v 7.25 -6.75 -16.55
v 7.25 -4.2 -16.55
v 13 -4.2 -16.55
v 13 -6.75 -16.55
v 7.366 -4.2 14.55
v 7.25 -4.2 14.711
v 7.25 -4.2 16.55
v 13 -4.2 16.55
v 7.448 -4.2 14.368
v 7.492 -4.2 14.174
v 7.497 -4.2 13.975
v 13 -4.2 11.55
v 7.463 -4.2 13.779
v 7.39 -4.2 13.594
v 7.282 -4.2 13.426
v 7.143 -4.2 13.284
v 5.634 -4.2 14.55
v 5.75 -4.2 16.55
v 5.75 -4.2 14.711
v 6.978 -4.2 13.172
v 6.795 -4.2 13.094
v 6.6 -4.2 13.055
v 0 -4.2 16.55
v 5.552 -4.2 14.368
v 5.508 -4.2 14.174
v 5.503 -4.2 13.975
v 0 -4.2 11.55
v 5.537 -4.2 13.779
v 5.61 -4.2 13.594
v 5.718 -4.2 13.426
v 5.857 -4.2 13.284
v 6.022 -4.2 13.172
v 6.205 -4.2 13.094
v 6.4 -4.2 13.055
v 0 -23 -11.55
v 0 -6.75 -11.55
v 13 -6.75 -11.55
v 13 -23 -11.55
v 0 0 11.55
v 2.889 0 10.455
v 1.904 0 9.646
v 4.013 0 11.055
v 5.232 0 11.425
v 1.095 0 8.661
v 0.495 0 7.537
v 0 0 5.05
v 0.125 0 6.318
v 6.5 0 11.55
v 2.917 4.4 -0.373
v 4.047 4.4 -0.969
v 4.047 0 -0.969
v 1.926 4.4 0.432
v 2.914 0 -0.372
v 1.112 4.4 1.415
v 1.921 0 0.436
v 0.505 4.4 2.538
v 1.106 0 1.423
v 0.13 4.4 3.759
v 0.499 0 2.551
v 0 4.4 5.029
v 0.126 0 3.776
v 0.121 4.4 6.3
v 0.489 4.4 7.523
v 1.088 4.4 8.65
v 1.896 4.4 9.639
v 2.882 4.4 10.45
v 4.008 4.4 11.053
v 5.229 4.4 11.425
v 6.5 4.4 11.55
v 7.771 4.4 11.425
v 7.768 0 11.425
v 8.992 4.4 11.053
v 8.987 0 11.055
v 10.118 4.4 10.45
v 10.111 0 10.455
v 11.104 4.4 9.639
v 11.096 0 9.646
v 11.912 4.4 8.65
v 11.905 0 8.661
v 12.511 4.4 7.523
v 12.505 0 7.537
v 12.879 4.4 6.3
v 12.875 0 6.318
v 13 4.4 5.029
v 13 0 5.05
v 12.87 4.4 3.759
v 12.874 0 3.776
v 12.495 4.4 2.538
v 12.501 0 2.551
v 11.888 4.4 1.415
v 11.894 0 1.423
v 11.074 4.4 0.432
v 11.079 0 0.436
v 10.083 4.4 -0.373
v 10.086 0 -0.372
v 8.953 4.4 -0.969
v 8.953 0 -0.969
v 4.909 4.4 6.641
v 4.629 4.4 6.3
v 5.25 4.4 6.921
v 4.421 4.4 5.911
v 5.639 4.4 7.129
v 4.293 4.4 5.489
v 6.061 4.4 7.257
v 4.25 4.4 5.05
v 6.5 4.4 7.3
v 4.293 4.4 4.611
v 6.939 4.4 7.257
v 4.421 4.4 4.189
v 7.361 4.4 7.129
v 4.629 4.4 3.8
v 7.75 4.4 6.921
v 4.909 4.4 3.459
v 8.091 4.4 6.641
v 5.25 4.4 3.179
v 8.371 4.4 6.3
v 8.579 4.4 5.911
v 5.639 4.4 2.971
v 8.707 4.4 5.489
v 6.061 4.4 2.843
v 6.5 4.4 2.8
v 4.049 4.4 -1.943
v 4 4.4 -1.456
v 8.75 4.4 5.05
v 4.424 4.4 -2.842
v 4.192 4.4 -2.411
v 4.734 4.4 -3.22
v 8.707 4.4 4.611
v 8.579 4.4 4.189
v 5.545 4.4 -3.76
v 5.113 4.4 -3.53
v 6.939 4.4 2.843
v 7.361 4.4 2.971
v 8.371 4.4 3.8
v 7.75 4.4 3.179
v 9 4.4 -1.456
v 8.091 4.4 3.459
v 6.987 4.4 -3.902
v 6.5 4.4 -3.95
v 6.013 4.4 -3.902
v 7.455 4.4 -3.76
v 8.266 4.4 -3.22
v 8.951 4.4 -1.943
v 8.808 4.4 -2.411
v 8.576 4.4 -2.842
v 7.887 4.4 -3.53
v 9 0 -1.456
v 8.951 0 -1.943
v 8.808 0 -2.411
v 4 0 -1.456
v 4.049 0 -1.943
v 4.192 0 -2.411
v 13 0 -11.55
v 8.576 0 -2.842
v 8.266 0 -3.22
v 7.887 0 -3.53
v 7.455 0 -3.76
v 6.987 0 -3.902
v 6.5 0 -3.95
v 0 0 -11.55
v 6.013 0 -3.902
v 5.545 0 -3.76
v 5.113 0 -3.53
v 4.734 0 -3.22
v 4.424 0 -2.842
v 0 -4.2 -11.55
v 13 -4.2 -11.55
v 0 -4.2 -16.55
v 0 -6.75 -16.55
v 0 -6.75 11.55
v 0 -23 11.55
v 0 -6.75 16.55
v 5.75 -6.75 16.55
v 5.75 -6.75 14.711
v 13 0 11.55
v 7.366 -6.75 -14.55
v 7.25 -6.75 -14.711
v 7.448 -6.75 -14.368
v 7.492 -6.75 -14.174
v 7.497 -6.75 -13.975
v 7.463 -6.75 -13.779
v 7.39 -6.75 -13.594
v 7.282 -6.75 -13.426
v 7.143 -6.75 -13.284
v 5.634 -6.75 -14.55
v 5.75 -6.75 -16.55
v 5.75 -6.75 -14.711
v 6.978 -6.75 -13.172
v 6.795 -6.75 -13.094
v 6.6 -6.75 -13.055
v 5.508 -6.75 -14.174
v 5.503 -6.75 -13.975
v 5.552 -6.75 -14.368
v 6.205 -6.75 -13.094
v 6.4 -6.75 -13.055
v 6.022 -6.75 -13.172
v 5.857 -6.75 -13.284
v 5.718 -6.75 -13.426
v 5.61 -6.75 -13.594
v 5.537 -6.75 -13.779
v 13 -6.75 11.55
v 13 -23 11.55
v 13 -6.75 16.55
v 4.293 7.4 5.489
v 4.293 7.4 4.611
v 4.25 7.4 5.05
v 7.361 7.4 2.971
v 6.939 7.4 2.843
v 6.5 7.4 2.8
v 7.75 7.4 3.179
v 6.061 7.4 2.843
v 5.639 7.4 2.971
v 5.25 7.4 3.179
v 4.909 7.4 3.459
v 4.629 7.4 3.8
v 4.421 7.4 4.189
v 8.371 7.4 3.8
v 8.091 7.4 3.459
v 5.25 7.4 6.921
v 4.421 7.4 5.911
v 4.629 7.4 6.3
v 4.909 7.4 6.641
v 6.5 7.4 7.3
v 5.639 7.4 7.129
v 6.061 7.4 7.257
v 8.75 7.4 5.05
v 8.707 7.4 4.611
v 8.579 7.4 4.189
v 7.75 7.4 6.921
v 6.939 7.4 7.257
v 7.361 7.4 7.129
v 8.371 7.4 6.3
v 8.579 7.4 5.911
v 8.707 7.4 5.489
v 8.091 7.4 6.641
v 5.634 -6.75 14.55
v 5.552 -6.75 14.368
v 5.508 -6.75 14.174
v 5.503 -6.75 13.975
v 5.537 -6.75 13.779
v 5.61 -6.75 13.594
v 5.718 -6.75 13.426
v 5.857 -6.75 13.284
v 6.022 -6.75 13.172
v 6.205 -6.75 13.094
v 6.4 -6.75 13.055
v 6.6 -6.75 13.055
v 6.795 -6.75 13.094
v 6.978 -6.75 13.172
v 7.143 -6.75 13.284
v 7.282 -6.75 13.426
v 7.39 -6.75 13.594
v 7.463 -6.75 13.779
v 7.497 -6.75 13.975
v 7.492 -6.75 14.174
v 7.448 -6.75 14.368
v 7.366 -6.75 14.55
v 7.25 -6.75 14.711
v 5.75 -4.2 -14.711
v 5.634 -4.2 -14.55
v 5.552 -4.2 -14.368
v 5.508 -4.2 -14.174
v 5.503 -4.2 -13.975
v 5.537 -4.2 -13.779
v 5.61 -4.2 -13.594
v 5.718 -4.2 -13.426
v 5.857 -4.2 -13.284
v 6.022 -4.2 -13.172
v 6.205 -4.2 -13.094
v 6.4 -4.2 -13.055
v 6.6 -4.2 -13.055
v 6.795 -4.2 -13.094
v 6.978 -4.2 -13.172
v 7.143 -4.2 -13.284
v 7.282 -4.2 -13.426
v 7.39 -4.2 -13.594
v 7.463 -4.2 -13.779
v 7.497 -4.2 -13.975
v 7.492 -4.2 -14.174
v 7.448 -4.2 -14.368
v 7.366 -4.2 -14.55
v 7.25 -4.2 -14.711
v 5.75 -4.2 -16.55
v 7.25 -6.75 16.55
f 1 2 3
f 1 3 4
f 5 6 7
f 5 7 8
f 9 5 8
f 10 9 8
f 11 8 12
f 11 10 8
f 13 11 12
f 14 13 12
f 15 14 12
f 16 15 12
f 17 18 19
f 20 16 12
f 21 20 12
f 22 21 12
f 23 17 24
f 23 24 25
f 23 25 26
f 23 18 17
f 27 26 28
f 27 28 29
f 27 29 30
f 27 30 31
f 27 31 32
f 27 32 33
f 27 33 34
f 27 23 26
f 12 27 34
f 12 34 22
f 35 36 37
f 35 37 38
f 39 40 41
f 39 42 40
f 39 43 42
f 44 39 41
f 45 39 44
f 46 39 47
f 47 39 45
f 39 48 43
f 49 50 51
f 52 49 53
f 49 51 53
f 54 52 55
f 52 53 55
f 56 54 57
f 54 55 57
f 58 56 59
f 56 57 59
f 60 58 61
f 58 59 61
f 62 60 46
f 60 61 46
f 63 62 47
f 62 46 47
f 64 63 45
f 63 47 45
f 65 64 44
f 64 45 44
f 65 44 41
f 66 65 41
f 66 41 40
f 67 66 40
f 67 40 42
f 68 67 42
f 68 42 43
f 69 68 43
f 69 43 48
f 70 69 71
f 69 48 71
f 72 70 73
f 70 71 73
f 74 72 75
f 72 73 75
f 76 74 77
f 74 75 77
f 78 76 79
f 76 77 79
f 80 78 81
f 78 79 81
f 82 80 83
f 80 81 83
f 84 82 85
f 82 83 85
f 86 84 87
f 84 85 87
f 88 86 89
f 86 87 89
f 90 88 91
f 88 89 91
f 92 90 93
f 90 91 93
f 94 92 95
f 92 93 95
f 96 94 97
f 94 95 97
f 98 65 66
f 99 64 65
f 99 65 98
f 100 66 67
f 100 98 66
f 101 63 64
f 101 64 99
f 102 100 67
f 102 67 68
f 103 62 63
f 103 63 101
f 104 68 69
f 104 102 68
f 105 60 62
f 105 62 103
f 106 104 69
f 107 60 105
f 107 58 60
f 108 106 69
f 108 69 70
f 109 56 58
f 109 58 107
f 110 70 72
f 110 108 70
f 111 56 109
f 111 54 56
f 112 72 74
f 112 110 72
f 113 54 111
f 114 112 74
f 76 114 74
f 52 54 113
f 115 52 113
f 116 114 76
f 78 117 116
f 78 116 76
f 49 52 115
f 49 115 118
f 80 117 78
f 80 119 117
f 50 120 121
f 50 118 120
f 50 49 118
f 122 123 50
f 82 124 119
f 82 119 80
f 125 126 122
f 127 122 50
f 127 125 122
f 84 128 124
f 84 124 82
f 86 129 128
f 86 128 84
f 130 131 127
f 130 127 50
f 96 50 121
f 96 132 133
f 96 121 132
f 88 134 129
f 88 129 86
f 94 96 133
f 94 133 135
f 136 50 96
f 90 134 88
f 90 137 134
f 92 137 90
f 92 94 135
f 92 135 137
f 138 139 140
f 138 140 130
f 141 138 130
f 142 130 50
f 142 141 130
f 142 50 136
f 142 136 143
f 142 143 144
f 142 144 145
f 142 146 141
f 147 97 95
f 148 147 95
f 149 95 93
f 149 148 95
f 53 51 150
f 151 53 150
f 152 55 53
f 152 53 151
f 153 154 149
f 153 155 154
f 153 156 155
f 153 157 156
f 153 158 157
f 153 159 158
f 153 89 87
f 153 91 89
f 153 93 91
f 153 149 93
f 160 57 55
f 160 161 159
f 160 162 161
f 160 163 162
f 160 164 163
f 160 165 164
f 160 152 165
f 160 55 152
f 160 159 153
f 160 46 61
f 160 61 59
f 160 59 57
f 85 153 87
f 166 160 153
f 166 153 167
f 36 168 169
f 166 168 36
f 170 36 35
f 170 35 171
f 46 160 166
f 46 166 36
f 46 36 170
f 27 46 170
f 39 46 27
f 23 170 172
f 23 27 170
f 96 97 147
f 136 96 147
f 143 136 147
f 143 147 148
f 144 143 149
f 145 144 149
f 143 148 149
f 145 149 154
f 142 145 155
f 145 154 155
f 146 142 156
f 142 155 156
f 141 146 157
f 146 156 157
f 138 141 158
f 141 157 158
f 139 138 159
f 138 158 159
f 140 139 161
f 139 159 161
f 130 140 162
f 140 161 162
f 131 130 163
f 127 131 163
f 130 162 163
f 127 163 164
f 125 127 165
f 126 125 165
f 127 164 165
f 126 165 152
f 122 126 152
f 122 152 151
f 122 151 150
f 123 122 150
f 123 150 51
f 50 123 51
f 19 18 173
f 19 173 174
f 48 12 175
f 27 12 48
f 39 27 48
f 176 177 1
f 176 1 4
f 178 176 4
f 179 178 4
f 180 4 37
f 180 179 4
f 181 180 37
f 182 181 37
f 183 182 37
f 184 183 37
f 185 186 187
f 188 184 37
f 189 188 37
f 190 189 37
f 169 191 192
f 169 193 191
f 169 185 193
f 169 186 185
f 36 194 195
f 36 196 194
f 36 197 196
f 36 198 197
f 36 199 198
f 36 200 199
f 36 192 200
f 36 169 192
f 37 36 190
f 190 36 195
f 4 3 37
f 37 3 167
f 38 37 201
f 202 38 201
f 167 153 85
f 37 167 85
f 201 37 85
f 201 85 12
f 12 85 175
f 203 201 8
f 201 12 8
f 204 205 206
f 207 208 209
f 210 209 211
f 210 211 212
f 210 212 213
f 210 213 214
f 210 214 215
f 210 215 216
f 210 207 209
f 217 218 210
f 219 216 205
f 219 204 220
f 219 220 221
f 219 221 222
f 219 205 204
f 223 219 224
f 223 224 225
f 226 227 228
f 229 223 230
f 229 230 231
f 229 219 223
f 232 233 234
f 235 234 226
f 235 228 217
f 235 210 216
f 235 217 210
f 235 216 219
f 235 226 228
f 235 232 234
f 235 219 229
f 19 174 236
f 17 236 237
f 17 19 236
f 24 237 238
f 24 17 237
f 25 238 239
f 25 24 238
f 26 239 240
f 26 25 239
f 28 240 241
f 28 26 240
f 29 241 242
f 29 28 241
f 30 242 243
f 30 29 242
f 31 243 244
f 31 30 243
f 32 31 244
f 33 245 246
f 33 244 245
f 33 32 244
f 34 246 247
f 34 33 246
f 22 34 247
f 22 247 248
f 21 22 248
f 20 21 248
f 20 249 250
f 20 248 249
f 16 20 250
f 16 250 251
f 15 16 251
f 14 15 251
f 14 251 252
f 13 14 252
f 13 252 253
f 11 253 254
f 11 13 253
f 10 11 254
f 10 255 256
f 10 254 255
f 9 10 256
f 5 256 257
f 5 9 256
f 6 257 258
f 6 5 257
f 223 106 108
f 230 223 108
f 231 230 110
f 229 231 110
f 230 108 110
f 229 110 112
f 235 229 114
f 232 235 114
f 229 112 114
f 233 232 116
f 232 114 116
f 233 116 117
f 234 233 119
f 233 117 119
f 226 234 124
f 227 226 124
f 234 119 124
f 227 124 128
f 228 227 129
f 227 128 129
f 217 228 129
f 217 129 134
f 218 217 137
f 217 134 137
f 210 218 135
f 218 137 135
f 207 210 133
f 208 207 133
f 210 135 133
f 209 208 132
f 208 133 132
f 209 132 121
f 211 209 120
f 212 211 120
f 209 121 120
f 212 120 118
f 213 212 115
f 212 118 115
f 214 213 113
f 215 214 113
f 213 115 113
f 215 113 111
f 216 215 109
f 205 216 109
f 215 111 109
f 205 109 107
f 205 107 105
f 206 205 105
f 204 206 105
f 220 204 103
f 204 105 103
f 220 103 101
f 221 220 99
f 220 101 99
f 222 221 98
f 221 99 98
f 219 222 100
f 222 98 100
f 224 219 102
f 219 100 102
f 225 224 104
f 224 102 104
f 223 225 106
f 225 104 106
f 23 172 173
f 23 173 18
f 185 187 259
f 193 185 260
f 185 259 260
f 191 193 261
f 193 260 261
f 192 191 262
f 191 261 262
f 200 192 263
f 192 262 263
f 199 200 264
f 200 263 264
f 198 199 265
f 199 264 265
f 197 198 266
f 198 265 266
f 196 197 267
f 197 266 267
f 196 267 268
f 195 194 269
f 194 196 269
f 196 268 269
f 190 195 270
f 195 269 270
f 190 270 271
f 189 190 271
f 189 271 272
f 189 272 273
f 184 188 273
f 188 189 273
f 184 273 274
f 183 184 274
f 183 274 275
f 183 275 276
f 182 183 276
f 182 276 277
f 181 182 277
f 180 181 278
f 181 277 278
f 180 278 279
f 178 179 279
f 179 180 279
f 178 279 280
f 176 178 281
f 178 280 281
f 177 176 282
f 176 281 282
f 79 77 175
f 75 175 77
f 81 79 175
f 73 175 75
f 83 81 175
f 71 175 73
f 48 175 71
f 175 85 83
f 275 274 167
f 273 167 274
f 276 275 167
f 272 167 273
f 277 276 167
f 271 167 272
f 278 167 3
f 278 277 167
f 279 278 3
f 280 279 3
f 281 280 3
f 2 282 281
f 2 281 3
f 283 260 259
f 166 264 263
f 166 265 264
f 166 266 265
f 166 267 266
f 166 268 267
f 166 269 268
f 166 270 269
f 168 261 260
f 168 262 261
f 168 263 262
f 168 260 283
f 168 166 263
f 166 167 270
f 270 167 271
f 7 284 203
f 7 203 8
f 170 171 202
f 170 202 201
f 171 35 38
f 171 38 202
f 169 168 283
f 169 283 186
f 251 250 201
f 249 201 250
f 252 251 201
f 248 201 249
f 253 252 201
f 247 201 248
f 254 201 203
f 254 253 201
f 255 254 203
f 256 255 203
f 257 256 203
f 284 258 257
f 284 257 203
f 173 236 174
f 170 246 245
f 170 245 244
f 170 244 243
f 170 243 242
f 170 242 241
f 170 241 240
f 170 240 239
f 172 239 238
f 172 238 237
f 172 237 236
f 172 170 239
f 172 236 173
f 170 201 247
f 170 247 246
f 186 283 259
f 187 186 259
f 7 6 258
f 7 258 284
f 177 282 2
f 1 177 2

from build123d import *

# Parameters (mm, degrees)
BOSS_EXTRUDE1_DEPTH = 13
BOSS_EXTRUDE2_DEPTH = 4.4
SKETCH3_R           = 2.25
BOSS_EXTRUDE3_DEPTH = 3
CUT_EXTRUDE1_REACH  = 30.22


with BuildPart() as part:
    # Sketch1 → Boss-Extrude1 (new body)
    with BuildSketch(Plane(origin=(0, 0, 0), x_dir=(0, 0, -1), z_dir=(1, 0, 0))):
        Polygon((11.55, -4.2), (16.55, -4.2), (16.55, -6.75), (11.55, -6.75), (11.55, -23), (-11.55, -23), (-11.55, -6.75), (-16.55, -6.75), (-16.55, -4.2), (-11.55, -4.2), (-11.55, 0), (11.55, 0), align=None)
    extrude(amount=BOSS_EXTRUDE1_DEPTH)

    # Sketch2 → Boss-Extrude2 (add)
    with BuildSketch(Plane(origin=(0, 0, 0), x_dir=(1, 0, 0), z_dir=(0, 1, 0))):
        with BuildLine():
            ThreePointArc((4.046663303, 0.969230769), (6.5, -11.55), (8.953336697, 0.969230769))
            ThreePointArc((8.953336697, 0.969230769), (6.5, 3.95), (4.046663303, 0.969230769))
        make_face()
    extrude(amount=BOSS_EXTRUDE2_DEPTH)

    # Sketch3 → Boss-Extrude3 (add)
    with BuildSketch(Plane(origin=(0, 4.4, 0), x_dir=(1, 0, 0), z_dir=(0, 1, 0))):
        with Locations(Location((6.5, -5.05, 0), (0, 0, 270))):
            Circle(SKETCH3_R)
    extrude(amount=BOSS_EXTRUDE3_DEPTH)

    # Sketch4 → Cut-Extrude1 (cut, up to next)
    with BuildSketch(Plane(origin=(0, -4.2, 0), x_dir=(1, 0, 0), z_dir=(0, 1, 0)), mode=Mode.PRIVATE) as cut_extrude1_sk1:
        with BuildLine():
            Line((5.75, -16.55), (5.75, -14.711437828))
            ThreePointArc((5.75, -14.711437828), (6.5, -13.05), (7.25, -14.711437828))
            Line((7.25, -14.711437828), (7.25, -16.55))
            Line((7.25, -16.55), (5.75, -16.55))
        make_face()
    cut_extrude1_tool1 = extrude(cut_extrude1_sk1.sketch, amount=-CUT_EXTRUDE1_REACH, mode=Mode.PRIVATE) & part.part
    cut_extrude1 = cut_extrude1_tool1.solids().sort_by_distance((6.5, -4.2, 14.785135))[0]
    add(cut_extrude1, mode=Mode.SUBTRACT)

    # Mirror1: Cut-Extrude1 across plane
    add(cut_extrude1.mirror(Plane.XY), mode=Mode.SUBTRACT)


solid = part.part
